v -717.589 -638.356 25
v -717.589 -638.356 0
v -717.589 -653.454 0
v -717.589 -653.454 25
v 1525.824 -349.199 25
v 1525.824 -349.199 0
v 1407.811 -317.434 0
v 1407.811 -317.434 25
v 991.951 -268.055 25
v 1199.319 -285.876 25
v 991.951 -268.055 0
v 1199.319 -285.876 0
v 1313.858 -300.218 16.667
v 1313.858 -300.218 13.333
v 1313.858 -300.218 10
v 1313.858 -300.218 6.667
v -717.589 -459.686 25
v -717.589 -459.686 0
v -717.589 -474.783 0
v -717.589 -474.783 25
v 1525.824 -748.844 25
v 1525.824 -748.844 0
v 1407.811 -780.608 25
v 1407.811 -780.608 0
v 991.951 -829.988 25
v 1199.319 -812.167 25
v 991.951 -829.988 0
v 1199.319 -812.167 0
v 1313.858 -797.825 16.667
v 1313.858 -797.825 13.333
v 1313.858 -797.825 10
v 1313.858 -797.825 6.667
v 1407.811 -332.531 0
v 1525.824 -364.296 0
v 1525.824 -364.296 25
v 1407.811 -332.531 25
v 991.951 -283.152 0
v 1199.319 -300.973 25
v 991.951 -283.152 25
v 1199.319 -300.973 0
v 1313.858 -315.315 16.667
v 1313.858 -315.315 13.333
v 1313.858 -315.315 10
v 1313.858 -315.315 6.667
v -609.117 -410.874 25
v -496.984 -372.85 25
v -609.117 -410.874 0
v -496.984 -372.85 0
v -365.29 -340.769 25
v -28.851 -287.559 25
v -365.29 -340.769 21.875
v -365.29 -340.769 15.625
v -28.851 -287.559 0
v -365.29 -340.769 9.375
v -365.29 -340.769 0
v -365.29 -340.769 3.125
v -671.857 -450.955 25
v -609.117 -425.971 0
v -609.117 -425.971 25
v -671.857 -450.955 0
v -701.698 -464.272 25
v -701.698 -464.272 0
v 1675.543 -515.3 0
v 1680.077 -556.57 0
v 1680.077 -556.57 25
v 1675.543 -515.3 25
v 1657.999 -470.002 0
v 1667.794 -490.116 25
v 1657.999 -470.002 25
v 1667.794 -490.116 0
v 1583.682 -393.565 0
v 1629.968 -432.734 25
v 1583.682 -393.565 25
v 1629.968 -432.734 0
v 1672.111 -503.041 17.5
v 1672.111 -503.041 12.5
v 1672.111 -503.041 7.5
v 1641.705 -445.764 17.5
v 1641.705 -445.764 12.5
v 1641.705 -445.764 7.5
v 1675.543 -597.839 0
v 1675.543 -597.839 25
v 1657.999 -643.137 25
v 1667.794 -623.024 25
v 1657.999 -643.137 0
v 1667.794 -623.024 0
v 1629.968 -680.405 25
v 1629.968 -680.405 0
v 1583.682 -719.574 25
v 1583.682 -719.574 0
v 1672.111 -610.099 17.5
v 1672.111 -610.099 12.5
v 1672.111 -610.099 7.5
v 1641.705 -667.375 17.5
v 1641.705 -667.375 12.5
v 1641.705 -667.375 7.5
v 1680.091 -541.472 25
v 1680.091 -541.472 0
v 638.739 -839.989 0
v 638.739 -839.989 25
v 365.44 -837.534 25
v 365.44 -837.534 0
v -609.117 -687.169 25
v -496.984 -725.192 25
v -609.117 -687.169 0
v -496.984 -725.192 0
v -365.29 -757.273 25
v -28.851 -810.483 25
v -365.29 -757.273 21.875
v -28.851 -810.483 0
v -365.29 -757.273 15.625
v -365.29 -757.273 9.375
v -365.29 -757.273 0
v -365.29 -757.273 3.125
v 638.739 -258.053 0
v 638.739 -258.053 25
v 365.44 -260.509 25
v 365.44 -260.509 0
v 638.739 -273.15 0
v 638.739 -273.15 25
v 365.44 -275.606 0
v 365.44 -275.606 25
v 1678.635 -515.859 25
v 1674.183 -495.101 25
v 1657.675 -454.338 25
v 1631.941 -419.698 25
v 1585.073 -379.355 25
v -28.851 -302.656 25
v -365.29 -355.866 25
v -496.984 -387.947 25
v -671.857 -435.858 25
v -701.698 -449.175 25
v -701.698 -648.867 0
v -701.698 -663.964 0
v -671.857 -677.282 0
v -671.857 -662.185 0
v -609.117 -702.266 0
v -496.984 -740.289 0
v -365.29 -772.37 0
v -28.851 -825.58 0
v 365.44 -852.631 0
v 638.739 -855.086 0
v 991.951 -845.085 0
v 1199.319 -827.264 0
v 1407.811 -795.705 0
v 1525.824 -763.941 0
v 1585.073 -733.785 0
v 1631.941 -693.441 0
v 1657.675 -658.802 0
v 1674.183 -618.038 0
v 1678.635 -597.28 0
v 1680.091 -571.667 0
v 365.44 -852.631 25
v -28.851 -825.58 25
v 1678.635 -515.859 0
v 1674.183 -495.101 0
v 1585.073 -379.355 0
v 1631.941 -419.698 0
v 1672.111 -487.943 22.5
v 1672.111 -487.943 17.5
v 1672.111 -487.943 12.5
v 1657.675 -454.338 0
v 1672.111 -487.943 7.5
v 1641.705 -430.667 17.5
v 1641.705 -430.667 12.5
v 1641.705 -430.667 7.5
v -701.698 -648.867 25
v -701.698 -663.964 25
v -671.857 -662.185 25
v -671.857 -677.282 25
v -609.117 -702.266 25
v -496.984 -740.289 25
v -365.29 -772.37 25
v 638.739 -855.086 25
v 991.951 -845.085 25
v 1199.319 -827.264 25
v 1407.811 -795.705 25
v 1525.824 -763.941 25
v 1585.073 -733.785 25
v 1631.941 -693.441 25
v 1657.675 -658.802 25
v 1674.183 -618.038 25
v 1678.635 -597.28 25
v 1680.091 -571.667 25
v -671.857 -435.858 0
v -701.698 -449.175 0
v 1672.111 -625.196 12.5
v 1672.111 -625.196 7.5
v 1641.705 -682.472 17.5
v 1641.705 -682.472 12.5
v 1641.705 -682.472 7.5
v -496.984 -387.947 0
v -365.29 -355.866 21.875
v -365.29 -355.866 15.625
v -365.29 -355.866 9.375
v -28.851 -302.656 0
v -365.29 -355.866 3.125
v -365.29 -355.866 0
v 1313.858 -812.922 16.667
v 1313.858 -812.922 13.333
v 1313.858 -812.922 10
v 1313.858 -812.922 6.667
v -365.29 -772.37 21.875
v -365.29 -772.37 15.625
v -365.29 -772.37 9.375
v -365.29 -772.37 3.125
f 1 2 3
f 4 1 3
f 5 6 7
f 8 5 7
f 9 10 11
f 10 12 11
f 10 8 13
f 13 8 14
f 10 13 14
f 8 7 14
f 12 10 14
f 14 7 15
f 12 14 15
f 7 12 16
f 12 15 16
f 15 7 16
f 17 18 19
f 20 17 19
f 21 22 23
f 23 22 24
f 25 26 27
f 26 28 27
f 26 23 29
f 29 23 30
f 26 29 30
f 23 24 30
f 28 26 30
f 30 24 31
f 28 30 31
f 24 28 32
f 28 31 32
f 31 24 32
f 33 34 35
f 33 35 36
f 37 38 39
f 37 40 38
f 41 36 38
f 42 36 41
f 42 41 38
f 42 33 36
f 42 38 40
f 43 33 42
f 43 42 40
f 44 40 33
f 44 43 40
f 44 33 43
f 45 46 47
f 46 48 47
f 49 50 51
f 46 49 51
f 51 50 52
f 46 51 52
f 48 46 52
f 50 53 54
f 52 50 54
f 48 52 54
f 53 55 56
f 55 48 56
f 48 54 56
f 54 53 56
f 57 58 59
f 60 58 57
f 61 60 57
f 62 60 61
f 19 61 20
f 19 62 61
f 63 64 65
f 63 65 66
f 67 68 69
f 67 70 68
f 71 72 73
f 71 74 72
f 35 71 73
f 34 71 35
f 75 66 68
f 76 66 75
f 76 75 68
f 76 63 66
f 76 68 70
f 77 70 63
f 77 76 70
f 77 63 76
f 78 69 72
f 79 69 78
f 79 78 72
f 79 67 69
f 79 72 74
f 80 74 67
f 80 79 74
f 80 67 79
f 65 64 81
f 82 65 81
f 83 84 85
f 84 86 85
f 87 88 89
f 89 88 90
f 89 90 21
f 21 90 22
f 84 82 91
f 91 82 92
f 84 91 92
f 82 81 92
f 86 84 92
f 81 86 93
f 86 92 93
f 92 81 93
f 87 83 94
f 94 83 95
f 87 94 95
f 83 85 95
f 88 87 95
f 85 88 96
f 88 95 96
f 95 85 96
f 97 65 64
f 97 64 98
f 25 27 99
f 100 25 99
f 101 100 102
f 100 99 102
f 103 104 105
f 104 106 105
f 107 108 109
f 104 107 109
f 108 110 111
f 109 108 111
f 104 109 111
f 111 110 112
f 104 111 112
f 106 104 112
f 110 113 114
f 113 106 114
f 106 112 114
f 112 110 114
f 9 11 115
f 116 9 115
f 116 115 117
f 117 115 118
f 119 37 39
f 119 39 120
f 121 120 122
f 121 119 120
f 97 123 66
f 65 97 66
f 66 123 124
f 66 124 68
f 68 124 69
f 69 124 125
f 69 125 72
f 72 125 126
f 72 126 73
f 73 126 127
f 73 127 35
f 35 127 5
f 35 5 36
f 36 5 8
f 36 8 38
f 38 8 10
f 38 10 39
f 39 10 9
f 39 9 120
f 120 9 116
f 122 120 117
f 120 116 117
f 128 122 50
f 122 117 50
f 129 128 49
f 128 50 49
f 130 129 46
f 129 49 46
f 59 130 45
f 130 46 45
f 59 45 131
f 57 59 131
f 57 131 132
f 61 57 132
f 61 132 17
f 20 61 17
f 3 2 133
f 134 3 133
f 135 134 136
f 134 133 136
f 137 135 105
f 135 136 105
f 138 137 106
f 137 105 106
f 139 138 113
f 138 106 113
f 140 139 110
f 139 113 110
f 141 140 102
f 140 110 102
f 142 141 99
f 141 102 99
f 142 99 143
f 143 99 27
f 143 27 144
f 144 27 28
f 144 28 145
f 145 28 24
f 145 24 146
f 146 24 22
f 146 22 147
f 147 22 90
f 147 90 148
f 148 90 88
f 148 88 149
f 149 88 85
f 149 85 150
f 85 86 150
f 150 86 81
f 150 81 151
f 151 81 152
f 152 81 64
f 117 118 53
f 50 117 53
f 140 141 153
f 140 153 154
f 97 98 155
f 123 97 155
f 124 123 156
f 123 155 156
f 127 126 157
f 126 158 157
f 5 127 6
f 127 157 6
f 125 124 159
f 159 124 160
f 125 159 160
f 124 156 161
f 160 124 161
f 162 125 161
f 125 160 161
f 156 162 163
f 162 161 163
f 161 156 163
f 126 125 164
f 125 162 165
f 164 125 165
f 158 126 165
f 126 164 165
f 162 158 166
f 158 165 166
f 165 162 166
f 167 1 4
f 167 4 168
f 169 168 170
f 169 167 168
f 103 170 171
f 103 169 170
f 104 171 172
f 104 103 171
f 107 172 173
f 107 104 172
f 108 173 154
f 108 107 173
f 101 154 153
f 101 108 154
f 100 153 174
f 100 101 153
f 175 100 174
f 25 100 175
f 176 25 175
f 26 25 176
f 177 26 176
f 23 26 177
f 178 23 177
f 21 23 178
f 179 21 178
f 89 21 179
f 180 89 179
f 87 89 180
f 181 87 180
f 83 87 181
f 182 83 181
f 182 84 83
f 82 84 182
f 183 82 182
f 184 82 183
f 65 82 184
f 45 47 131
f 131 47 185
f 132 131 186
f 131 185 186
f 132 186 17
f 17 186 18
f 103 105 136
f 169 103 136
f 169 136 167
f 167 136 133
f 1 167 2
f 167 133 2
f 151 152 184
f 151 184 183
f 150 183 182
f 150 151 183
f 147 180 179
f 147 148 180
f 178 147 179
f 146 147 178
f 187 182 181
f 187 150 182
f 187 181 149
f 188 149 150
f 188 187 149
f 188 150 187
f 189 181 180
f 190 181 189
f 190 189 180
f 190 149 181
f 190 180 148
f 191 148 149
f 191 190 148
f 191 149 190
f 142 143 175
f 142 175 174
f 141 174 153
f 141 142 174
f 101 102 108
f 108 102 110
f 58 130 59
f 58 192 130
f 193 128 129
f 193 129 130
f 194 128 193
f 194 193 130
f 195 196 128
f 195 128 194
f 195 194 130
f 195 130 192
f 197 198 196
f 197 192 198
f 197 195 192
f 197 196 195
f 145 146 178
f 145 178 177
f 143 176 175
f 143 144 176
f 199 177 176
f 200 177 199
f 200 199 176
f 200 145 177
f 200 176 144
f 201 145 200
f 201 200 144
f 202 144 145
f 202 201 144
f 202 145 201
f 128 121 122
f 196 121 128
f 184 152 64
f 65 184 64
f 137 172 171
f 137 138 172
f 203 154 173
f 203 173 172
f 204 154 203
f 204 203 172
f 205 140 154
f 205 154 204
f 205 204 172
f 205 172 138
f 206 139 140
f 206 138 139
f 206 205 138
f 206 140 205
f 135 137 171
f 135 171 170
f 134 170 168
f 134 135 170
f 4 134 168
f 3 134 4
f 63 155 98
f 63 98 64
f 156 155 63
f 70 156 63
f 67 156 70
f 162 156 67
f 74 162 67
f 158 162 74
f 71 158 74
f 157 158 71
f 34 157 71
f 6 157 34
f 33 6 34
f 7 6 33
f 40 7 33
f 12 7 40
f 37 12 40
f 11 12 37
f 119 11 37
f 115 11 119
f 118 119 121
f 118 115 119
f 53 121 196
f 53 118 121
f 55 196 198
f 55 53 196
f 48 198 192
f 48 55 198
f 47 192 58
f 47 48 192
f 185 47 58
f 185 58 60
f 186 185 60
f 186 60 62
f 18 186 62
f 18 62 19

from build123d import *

# Parameters (mm, degrees)
F1_DEPTH = 25


with BuildPart() as f1:
    # F0 (on Top) → F1 (new body)
    with BuildSketch(Plane.XY):
        with BuildLine():
            Line((1680.0913779151, -571.6674201901), (1680.0774248615, -556.5697550774))
            add(Edge.make_bspline(
                [(1680.0774248615, -556.5697550774), (1679.959532706, -562.316875416), (1679.6427719948, -573.6815119363), (1677.9559973128, -589.6482367852), (1671.9416158112, -611.1937525038), (1665.7175358203, -630.2057384714), (1649.1999387753, -658.7888643928), (1634.19991008, -676.479779451), (1613.0698656847, -697.3833068317), (1589.168561335, -717.3172273642), (1557.042322142, -734.859485432), (1536.1277959476, -744.2282900222), (1525.8240908453, -748.8439046694)],
                knots=[0, 0, 0, 0, 0.0810522115, 0.1602959901, 0.2519108121, 0.3416965034, 0.4533023492, 0.5495072043, 0.6552927613, 0.7658251362, 0.884630944, 1, 1, 1, 1], degree=3))
            add(Edge.make_bspline(
                [(1525.8240908453, -748.8439046694), (1520.9143328422, -750.4920177967), (1510.6684952452, -753.9313521657), (1492.8886117624, -760.36139908), (1477.3550772596, -765.5186171491), (1460.6783442632, -768.5296377887), (1443.7541912337, -774.5896497238), (1426.4828431131, -776.3239099017), (1404.0685526248, -781.6651315049), (1367.3994007551, -788.3225763114), (1318.300808924, -797.4866814611), (1266.860132466, -804.7429770618), (1195.8736917115, -813.0319192887), (1152.1833674352, -815.541908763), (1096.6435090665, -821.3018918652), (1042.2588720968, -826.7735922357), (1008.4323175903, -828.9346523367), (991.9508308241, -829.9875968053)],
                knots=[0, 0, 0, 0, 0.0459056837, 0.0957974262, 0.1423705621, 0.1895049005, 0.2379350442, 0.285260399, 0.3396724785, 0.4098119199, 0.4907159265, 0.5750621704, 0.6713772105, 0.7482917328, 0.8331639502, 0.9187116102, 1, 1, 1, 1], degree=3))
            add(Edge.make_bspline(
                [(991.9508308241, -829.9875968053), (945.3347618176, -832.2467041737), (840.6711361721, -837.318911525), (597.3261368323, -840.7321202495), (496.8183550639, -840.977614608), (410.7138135756, -838.7205696222), (365.4399573872, -837.5338130547)],
                knots=[0, 0, 0, 0, 0.2514168302, 0.5644876875, 0.7710071796, 1, 1, 1, 1], degree=3))
            add(Edge.make_bspline(
                [(365.4399573872, -837.5338130547), (300.9920694953, -835.0287898915), (185.1527872494, -830.5262360496), (68.0175690605, -819.317919736), (2.3104109186, -813.3253669371), (-28.8509517839, -810.4834222151)],
                knots=[0, 0, 0, 0, 0.3973459993, 0.7141936978, 1, 1, 1, 1], degree=3))
            add(Edge.make_bspline(
                [(-28.8509517839, -810.4834222151), (-66.9724583954, -806.0046315132), (-140.8309261351, -797.3272037834), (-240.6082186036, -779.8814461057), (-325.5240634953, -767.1998298001), (-418.7926896131, -744.5692856785), (-475.2525690807, -731.7575140909), (-522.2780776943, -717.7608947511), (-567.7172627648, -703.9472926888), (-595.4583026837, -692.7045463144), (-609.1171294382, -687.1689670636)],
                knots=[0, 0, 0, 0, 0.15717668, 0.3045217721, 0.4423500794, 0.5860596972, 0.6983535216, 0.8003417202, 0.901694462, 1, 1, 1, 1], degree=3))
            add(Edge.make_bspline(
                [(-609.1171294382, -687.1689670636), (-619.9222350776, -684.0420639821), (-641.0395332321, -677.9303940328), (-667.6634247297, -663.4606444561), (-691.7272271694, -653.9900653187), (-708.2455744872, -645.7139702192), (-714.7001253353, -640.6102572147), (-717.5893870815, -638.3564808323)],
                knots=[0, 0, 0, 0, 0.2401836949, 0.4696628644, 0.6819727863, 0.8590310206, 1, 1, 1, 1], degree=3))
            Line((-717.5893870815, -638.3564808323), (-717.5893870815, -653.4535028888))
            add(Edge.make_bspline(
                [(-609.1171294382, -702.2659891202), (-619.9222350776, -699.1390860387), (-641.0395332321, -693.0274160894), (-667.6634247297, -678.5576665127), (-691.7272271694, -669.0870873753), (-708.2455744872, -660.8109922758), (-714.7001253353, -655.7072792713), (-717.5893870815, -653.4535028888)],
                knots=[0, 0, 0, 0, 0.2401836949, 0.4696628644, 0.6819727863, 0.8590310206, 1, 1, 1, 1], degree=3))
            add(Edge.make_bspline(
                [(-28.8509517839, -825.5804442717), (-66.9724583954, -821.1016535698), (-140.8309261351, -812.42422584), (-240.6082186036, -794.9784681623), (-325.5240634953, -782.2968518567), (-418.7926896131, -759.666307735), (-475.2525690807, -746.8545361475), (-522.2780776943, -732.8579168077), (-567.7172627648, -719.0443147453), (-595.4583026837, -707.801568371), (-609.1171294382, -702.2659891202)],
                knots=[0, 0, 0, 0, 0.15717668, 0.3045217721, 0.4423500794, 0.5860596972, 0.6983535216, 0.8003417202, 0.901694462, 1, 1, 1, 1], degree=3))
            add(Edge.make_bspline(
                [(365.4399573872, -852.6308351113), (300.9920694953, -850.1258119481), (185.1527872494, -845.6232581062), (68.0175690605, -834.4149417926), (2.3104109186, -828.4223889937), (-28.8509517839, -825.5804442717)],
                knots=[0, 0, 0, 0, 0.3973459993, 0.7141936978, 1, 1, 1, 1], degree=3))
            add(Edge.make_bspline(
                [(991.9508308241, -845.0846188618), (945.3347618176, -847.3437262303), (840.6711361721, -852.4159335816), (597.3261368323, -855.8291423061), (496.8183550639, -856.0746366646), (410.7138135756, -853.8175916788), (365.4399573872, -852.6308351113)],
                knots=[0, 0, 0, 0, 0.2514168302, 0.5644876875, 0.7710071796, 1, 1, 1, 1], degree=3))
            add(Edge.make_bspline(
                [(1525.8240908453, -763.940926726), (1520.9143328422, -765.5890398533), (1510.6684952452, -769.0283742223), (1492.8886117624, -775.4584211365), (1477.3550772596, -780.6156392057), (1460.6783442632, -783.6266598453), (1443.7541912337, -789.6866717803), (1426.4828431131, -791.4209319583), (1404.0685526248, -796.7621535615), (1367.3994007551, -803.4195983679), (1318.300808924, -812.5837035177), (1266.860132466, -819.8399991184), (1195.8736917115, -828.1289413453), (1152.1833674352, -830.6389308195), (1096.6435090665, -836.3989139217), (1042.2588720968, -841.8706142922), (1008.4323175903, -844.0316743933), (991.9508308241, -845.0846188618)],
                knots=[0, 0, 0, 0, 0.0459056837, 0.0957974262, 0.1423705621, 0.1895049005, 0.2379350442, 0.285260399, 0.3396724785, 0.4098119199, 0.4907159265, 0.5750621704, 0.6713772105, 0.7482917328, 0.8331639502, 0.9187116102, 1, 1, 1, 1], degree=3))
            add(Edge.make_bspline(
                [(1680.0913779151, -571.6674201901), (1679.9734861325, -577.4145223437), (1679.6364798397, -588.7782878472), (1677.9579597004, -604.7453411506), (1671.9410743397, -626.2907518495), (1665.7177198175, -645.3027682447), (1649.1998933253, -673.8858845461), (1634.1999227649, -691.5768020298), (1613.0698619015, -712.4803287716), (1589.1685627804, -732.4142493119), (1557.0423204483, -749.9565080936), (1536.1277988232, -759.3253107907), (1525.8240908453, -763.940926726)],
                knots=[0, 0, 0, 0, 0.081051955, 0.1602957558, 0.2519106034, 0.3416963197, 0.4533021966, 0.5495070786, 0.6552926651, 0.7658250708, 0.8846309118, 1, 1, 1, 1], degree=3))
        make_face()
    extrude(amount=F1_DEPTH)


with BuildPart() as f1b:
    # F0 (on Top) → F1, piece 2 (new body)
    with BuildSketch(Plane.XY):
        with BuildLine():
            add(Edge.make_bspline(
                [(1680.0774248615, -556.5697550774), (1679.959532706, -550.8226347387), (1679.6427719948, -539.4579982185), (1677.9559973128, -523.4912733695), (1671.9416158112, -501.945757651), (1665.7175358203, -482.9337716834), (1649.1999387753, -454.3506457619), (1634.19991008, -436.6597307037), (1613.0698656847, -415.7562033231), (1589.168561335, -395.8222827905), (1557.042322142, -378.2800247227), (1536.1277959476, -368.9112201325), (1525.8240908453, -364.2956054853)],
                knots=[0, 0, 0, 0, 0.0810522115, 0.1602959901, 0.2519108121, 0.3416965034, 0.4533023492, 0.5495072043, 0.6552927613, 0.7658251362, 0.884630944, 1, 1, 1, 1], degree=3))
            Line((1680.0774248615, -556.5697550774), (1680.0913779151, -541.4720899647))
            add(Edge.make_bspline(
                [(1680.0913779151, -541.4720899647), (1679.9734861325, -535.7249878111), (1679.6364798397, -524.3612223075), (1677.9579597004, -508.3941690041), (1671.9410743397, -486.8487583053), (1665.7177198175, -467.83674191), (1649.1998933253, -439.2536256087), (1634.1999227649, -421.562708125), (1613.0698619015, -400.6591813831), (1589.1685627804, -380.7252608429), (1557.0423204483, -363.1830020612), (1536.1277988232, -353.8141993641), (1525.8240908453, -349.1985834287)],
                knots=[0, 0, 0, 0, 0.081051955, 0.1602957558, 0.2519106034, 0.3416963197, 0.4533021966, 0.5495070786, 0.6552926651, 0.7658250708, 0.8846309118, 1, 1, 1, 1], degree=3))
            add(Edge.make_bspline(
                [(1525.8240908453, -349.1985834287), (1520.9143328422, -347.5504703014), (1510.6684952452, -344.1111359325), (1492.8886117624, -337.6810890182), (1477.3550772596, -332.523870949), (1460.6783442632, -329.5128503094), (1443.7541912337, -323.4528383744), (1426.4828431131, -321.7185781964), (1404.0685526248, -316.3773565932), (1367.3994007551, -309.7199117868), (1318.300808924, -300.555806637), (1266.860132466, -293.2995110363), (1195.8736917115, -285.0105688094), (1152.1833674352, -282.5005793352), (1096.6435090665, -276.740596233), (1042.2588720968, -271.2688958625), (1008.4323175903, -269.1078357614), (991.9508308241, -268.0548912929)],
                knots=[0, 0, 0, 0, 0.0459056837, 0.0957974262, 0.1423705621, 0.1895049005, 0.2379350442, 0.285260399, 0.3396724785, 0.4098119199, 0.4907159265, 0.5750621704, 0.6713772105, 0.7482917328, 0.8331639502, 0.9187116102, 1, 1, 1, 1], degree=3))
            add(Edge.make_bspline(
                [(991.9508308241, -268.0548912929), (945.3347618176, -265.7957839245), (840.6711361721, -260.7235765732), (597.3261368323, -257.3103678486), (496.8183550639, -257.0648734901), (410.7138135756, -259.321918476), (365.4399573872, -260.5086750434)],
                knots=[0, 0, 0, 0, 0.2514168302, 0.5644876875, 0.7710071796, 1, 1, 1, 1], degree=3))
            add(Edge.make_bspline(
                [(365.4399573872, -260.5086750434), (300.9920694953, -263.0136982066), (185.1527872494, -267.5162520485), (68.0175690605, -278.7245683622), (2.3104109186, -284.717121161), (-28.8509517839, -287.559065883)],
                knots=[0, 0, 0, 0, 0.3973459993, 0.7141936978, 1, 1, 1, 1], degree=3))
            add(Edge.make_bspline(
                [(-28.8509517839, -287.559065883), (-66.9724583954, -292.0378565849), (-140.8309261351, -300.7152843147), (-240.6082186036, -318.1610419925), (-325.5240634953, -330.8426582981), (-418.7926896131, -353.4732024197), (-475.2525690807, -366.2849740072), (-522.2780776943, -380.2815933471), (-567.7172627648, -394.0951954094), (-595.4583026837, -405.3379417837), (-609.1171294382, -410.8735210346)],
                knots=[0, 0, 0, 0, 0.15717668, 0.3045217721, 0.4423500794, 0.5860596972, 0.6983535216, 0.8003417202, 0.901694462, 1, 1, 1, 1], degree=3))
            add(Edge.make_bspline(
                [(-609.1171294382, -410.8735210346), (-619.9222350776, -414.000424116), (-641.0395332321, -420.1120940653), (-667.6634247297, -434.5818436421), (-691.7272271694, -444.0524227794), (-708.2455744872, -452.3285178789), (-714.7001253353, -457.4322308834), (-717.5893870815, -459.6860072659)],
                knots=[0, 0, 0, 0, 0.2401836949, 0.4696628644, 0.6819727863, 0.8590310206, 1, 1, 1, 1], degree=3))
            Line((-717.5893870815, -459.6860072659), (-717.5893870815, -474.7830293225))
            add(Edge.make_bspline(
                [(-609.1171294382, -425.9705430911), (-619.9222350776, -429.0974461726), (-641.0395332321, -435.2091161219), (-667.6634247297, -449.6788656987), (-691.7272271694, -459.149444836), (-708.2455744872, -467.4255399355), (-714.7001253353, -472.52925294), (-717.5893870815, -474.7830293225)],
                knots=[0, 0, 0, 0, 0.2401836949, 0.4696628644, 0.6819727863, 0.8590310206, 1, 1, 1, 1], degree=3))
            add(Edge.make_bspline(
                [(-28.8509517839, -302.6560879396), (-66.9724583954, -307.1348786415), (-140.8309261351, -315.8123063713), (-240.6082186036, -333.258064049), (-325.5240634953, -345.9396803546), (-418.7926896131, -368.5702244763), (-475.2525690807, -381.3819960638), (-522.2780776943, -395.3786154036), (-567.7172627648, -409.192217466), (-595.4583026837, -420.4349638403), (-609.1171294382, -425.9705430911)],
                knots=[0, 0, 0, 0, 0.15717668, 0.3045217721, 0.4423500794, 0.5860596972, 0.6983535216, 0.8003417202, 0.901694462, 1, 1, 1, 1], degree=3))
            add(Edge.make_bspline(
                [(365.4399573872, -275.6056971), (300.9920694953, -278.1107202632), (185.1527872494, -282.6132741051), (68.0175690605, -293.8215904187), (2.3104109186, -299.8141432176), (-28.8509517839, -302.6560879396)],
                knots=[0, 0, 0, 0, 0.3973459993, 0.7141936978, 1, 1, 1, 1], degree=3))
            add(Edge.make_bspline(
                [(991.9508308241, -283.1519133495), (945.3347618176, -280.892805981), (840.6711361721, -275.8205986297), (597.3261368323, -272.4073899052), (496.8183550639, -272.1618955467), (410.7138135756, -274.4189405325), (365.4399573872, -275.6056971)],
                knots=[0, 0, 0, 0, 0.2514168302, 0.5644876875, 0.7710071796, 1, 1, 1, 1], degree=3))
            add(Edge.make_bspline(
                [(1525.8240908453, -364.2956054853), (1520.9143328422, -362.647492358), (1510.6684952452, -359.208157989), (1492.8886117624, -352.7781110748), (1477.3550772596, -347.6208930056), (1460.6783442632, -344.609872366), (1443.7541912337, -338.549860431), (1426.4828431131, -336.815600253), (1404.0685526248, -331.4743786498), (1367.3994007551, -324.8169338434), (1318.300808924, -315.6528286936), (1266.860132466, -308.3965330929), (1195.8736917115, -300.107590866), (1152.1833674352, -297.5976013918), (1096.6435090665, -291.8376182896), (1042.2588720968, -286.3659179191), (1008.4323175903, -284.204857818), (991.9508308241, -283.1519133495)],
                knots=[0, 0, 0, 0, 0.0459056837, 0.0957974262, 0.1423705621, 0.1895049005, 0.2379350442, 0.285260399, 0.3396724785, 0.4098119199, 0.4907159265, 0.5750621704, 0.6713772105, 0.7482917328, 0.8331639502, 0.9187116102, 1, 1, 1, 1], degree=3))
        make_face()
    extrude(amount=F1_DEPTH)


solid = Compound([f1.part, f1b.part])
